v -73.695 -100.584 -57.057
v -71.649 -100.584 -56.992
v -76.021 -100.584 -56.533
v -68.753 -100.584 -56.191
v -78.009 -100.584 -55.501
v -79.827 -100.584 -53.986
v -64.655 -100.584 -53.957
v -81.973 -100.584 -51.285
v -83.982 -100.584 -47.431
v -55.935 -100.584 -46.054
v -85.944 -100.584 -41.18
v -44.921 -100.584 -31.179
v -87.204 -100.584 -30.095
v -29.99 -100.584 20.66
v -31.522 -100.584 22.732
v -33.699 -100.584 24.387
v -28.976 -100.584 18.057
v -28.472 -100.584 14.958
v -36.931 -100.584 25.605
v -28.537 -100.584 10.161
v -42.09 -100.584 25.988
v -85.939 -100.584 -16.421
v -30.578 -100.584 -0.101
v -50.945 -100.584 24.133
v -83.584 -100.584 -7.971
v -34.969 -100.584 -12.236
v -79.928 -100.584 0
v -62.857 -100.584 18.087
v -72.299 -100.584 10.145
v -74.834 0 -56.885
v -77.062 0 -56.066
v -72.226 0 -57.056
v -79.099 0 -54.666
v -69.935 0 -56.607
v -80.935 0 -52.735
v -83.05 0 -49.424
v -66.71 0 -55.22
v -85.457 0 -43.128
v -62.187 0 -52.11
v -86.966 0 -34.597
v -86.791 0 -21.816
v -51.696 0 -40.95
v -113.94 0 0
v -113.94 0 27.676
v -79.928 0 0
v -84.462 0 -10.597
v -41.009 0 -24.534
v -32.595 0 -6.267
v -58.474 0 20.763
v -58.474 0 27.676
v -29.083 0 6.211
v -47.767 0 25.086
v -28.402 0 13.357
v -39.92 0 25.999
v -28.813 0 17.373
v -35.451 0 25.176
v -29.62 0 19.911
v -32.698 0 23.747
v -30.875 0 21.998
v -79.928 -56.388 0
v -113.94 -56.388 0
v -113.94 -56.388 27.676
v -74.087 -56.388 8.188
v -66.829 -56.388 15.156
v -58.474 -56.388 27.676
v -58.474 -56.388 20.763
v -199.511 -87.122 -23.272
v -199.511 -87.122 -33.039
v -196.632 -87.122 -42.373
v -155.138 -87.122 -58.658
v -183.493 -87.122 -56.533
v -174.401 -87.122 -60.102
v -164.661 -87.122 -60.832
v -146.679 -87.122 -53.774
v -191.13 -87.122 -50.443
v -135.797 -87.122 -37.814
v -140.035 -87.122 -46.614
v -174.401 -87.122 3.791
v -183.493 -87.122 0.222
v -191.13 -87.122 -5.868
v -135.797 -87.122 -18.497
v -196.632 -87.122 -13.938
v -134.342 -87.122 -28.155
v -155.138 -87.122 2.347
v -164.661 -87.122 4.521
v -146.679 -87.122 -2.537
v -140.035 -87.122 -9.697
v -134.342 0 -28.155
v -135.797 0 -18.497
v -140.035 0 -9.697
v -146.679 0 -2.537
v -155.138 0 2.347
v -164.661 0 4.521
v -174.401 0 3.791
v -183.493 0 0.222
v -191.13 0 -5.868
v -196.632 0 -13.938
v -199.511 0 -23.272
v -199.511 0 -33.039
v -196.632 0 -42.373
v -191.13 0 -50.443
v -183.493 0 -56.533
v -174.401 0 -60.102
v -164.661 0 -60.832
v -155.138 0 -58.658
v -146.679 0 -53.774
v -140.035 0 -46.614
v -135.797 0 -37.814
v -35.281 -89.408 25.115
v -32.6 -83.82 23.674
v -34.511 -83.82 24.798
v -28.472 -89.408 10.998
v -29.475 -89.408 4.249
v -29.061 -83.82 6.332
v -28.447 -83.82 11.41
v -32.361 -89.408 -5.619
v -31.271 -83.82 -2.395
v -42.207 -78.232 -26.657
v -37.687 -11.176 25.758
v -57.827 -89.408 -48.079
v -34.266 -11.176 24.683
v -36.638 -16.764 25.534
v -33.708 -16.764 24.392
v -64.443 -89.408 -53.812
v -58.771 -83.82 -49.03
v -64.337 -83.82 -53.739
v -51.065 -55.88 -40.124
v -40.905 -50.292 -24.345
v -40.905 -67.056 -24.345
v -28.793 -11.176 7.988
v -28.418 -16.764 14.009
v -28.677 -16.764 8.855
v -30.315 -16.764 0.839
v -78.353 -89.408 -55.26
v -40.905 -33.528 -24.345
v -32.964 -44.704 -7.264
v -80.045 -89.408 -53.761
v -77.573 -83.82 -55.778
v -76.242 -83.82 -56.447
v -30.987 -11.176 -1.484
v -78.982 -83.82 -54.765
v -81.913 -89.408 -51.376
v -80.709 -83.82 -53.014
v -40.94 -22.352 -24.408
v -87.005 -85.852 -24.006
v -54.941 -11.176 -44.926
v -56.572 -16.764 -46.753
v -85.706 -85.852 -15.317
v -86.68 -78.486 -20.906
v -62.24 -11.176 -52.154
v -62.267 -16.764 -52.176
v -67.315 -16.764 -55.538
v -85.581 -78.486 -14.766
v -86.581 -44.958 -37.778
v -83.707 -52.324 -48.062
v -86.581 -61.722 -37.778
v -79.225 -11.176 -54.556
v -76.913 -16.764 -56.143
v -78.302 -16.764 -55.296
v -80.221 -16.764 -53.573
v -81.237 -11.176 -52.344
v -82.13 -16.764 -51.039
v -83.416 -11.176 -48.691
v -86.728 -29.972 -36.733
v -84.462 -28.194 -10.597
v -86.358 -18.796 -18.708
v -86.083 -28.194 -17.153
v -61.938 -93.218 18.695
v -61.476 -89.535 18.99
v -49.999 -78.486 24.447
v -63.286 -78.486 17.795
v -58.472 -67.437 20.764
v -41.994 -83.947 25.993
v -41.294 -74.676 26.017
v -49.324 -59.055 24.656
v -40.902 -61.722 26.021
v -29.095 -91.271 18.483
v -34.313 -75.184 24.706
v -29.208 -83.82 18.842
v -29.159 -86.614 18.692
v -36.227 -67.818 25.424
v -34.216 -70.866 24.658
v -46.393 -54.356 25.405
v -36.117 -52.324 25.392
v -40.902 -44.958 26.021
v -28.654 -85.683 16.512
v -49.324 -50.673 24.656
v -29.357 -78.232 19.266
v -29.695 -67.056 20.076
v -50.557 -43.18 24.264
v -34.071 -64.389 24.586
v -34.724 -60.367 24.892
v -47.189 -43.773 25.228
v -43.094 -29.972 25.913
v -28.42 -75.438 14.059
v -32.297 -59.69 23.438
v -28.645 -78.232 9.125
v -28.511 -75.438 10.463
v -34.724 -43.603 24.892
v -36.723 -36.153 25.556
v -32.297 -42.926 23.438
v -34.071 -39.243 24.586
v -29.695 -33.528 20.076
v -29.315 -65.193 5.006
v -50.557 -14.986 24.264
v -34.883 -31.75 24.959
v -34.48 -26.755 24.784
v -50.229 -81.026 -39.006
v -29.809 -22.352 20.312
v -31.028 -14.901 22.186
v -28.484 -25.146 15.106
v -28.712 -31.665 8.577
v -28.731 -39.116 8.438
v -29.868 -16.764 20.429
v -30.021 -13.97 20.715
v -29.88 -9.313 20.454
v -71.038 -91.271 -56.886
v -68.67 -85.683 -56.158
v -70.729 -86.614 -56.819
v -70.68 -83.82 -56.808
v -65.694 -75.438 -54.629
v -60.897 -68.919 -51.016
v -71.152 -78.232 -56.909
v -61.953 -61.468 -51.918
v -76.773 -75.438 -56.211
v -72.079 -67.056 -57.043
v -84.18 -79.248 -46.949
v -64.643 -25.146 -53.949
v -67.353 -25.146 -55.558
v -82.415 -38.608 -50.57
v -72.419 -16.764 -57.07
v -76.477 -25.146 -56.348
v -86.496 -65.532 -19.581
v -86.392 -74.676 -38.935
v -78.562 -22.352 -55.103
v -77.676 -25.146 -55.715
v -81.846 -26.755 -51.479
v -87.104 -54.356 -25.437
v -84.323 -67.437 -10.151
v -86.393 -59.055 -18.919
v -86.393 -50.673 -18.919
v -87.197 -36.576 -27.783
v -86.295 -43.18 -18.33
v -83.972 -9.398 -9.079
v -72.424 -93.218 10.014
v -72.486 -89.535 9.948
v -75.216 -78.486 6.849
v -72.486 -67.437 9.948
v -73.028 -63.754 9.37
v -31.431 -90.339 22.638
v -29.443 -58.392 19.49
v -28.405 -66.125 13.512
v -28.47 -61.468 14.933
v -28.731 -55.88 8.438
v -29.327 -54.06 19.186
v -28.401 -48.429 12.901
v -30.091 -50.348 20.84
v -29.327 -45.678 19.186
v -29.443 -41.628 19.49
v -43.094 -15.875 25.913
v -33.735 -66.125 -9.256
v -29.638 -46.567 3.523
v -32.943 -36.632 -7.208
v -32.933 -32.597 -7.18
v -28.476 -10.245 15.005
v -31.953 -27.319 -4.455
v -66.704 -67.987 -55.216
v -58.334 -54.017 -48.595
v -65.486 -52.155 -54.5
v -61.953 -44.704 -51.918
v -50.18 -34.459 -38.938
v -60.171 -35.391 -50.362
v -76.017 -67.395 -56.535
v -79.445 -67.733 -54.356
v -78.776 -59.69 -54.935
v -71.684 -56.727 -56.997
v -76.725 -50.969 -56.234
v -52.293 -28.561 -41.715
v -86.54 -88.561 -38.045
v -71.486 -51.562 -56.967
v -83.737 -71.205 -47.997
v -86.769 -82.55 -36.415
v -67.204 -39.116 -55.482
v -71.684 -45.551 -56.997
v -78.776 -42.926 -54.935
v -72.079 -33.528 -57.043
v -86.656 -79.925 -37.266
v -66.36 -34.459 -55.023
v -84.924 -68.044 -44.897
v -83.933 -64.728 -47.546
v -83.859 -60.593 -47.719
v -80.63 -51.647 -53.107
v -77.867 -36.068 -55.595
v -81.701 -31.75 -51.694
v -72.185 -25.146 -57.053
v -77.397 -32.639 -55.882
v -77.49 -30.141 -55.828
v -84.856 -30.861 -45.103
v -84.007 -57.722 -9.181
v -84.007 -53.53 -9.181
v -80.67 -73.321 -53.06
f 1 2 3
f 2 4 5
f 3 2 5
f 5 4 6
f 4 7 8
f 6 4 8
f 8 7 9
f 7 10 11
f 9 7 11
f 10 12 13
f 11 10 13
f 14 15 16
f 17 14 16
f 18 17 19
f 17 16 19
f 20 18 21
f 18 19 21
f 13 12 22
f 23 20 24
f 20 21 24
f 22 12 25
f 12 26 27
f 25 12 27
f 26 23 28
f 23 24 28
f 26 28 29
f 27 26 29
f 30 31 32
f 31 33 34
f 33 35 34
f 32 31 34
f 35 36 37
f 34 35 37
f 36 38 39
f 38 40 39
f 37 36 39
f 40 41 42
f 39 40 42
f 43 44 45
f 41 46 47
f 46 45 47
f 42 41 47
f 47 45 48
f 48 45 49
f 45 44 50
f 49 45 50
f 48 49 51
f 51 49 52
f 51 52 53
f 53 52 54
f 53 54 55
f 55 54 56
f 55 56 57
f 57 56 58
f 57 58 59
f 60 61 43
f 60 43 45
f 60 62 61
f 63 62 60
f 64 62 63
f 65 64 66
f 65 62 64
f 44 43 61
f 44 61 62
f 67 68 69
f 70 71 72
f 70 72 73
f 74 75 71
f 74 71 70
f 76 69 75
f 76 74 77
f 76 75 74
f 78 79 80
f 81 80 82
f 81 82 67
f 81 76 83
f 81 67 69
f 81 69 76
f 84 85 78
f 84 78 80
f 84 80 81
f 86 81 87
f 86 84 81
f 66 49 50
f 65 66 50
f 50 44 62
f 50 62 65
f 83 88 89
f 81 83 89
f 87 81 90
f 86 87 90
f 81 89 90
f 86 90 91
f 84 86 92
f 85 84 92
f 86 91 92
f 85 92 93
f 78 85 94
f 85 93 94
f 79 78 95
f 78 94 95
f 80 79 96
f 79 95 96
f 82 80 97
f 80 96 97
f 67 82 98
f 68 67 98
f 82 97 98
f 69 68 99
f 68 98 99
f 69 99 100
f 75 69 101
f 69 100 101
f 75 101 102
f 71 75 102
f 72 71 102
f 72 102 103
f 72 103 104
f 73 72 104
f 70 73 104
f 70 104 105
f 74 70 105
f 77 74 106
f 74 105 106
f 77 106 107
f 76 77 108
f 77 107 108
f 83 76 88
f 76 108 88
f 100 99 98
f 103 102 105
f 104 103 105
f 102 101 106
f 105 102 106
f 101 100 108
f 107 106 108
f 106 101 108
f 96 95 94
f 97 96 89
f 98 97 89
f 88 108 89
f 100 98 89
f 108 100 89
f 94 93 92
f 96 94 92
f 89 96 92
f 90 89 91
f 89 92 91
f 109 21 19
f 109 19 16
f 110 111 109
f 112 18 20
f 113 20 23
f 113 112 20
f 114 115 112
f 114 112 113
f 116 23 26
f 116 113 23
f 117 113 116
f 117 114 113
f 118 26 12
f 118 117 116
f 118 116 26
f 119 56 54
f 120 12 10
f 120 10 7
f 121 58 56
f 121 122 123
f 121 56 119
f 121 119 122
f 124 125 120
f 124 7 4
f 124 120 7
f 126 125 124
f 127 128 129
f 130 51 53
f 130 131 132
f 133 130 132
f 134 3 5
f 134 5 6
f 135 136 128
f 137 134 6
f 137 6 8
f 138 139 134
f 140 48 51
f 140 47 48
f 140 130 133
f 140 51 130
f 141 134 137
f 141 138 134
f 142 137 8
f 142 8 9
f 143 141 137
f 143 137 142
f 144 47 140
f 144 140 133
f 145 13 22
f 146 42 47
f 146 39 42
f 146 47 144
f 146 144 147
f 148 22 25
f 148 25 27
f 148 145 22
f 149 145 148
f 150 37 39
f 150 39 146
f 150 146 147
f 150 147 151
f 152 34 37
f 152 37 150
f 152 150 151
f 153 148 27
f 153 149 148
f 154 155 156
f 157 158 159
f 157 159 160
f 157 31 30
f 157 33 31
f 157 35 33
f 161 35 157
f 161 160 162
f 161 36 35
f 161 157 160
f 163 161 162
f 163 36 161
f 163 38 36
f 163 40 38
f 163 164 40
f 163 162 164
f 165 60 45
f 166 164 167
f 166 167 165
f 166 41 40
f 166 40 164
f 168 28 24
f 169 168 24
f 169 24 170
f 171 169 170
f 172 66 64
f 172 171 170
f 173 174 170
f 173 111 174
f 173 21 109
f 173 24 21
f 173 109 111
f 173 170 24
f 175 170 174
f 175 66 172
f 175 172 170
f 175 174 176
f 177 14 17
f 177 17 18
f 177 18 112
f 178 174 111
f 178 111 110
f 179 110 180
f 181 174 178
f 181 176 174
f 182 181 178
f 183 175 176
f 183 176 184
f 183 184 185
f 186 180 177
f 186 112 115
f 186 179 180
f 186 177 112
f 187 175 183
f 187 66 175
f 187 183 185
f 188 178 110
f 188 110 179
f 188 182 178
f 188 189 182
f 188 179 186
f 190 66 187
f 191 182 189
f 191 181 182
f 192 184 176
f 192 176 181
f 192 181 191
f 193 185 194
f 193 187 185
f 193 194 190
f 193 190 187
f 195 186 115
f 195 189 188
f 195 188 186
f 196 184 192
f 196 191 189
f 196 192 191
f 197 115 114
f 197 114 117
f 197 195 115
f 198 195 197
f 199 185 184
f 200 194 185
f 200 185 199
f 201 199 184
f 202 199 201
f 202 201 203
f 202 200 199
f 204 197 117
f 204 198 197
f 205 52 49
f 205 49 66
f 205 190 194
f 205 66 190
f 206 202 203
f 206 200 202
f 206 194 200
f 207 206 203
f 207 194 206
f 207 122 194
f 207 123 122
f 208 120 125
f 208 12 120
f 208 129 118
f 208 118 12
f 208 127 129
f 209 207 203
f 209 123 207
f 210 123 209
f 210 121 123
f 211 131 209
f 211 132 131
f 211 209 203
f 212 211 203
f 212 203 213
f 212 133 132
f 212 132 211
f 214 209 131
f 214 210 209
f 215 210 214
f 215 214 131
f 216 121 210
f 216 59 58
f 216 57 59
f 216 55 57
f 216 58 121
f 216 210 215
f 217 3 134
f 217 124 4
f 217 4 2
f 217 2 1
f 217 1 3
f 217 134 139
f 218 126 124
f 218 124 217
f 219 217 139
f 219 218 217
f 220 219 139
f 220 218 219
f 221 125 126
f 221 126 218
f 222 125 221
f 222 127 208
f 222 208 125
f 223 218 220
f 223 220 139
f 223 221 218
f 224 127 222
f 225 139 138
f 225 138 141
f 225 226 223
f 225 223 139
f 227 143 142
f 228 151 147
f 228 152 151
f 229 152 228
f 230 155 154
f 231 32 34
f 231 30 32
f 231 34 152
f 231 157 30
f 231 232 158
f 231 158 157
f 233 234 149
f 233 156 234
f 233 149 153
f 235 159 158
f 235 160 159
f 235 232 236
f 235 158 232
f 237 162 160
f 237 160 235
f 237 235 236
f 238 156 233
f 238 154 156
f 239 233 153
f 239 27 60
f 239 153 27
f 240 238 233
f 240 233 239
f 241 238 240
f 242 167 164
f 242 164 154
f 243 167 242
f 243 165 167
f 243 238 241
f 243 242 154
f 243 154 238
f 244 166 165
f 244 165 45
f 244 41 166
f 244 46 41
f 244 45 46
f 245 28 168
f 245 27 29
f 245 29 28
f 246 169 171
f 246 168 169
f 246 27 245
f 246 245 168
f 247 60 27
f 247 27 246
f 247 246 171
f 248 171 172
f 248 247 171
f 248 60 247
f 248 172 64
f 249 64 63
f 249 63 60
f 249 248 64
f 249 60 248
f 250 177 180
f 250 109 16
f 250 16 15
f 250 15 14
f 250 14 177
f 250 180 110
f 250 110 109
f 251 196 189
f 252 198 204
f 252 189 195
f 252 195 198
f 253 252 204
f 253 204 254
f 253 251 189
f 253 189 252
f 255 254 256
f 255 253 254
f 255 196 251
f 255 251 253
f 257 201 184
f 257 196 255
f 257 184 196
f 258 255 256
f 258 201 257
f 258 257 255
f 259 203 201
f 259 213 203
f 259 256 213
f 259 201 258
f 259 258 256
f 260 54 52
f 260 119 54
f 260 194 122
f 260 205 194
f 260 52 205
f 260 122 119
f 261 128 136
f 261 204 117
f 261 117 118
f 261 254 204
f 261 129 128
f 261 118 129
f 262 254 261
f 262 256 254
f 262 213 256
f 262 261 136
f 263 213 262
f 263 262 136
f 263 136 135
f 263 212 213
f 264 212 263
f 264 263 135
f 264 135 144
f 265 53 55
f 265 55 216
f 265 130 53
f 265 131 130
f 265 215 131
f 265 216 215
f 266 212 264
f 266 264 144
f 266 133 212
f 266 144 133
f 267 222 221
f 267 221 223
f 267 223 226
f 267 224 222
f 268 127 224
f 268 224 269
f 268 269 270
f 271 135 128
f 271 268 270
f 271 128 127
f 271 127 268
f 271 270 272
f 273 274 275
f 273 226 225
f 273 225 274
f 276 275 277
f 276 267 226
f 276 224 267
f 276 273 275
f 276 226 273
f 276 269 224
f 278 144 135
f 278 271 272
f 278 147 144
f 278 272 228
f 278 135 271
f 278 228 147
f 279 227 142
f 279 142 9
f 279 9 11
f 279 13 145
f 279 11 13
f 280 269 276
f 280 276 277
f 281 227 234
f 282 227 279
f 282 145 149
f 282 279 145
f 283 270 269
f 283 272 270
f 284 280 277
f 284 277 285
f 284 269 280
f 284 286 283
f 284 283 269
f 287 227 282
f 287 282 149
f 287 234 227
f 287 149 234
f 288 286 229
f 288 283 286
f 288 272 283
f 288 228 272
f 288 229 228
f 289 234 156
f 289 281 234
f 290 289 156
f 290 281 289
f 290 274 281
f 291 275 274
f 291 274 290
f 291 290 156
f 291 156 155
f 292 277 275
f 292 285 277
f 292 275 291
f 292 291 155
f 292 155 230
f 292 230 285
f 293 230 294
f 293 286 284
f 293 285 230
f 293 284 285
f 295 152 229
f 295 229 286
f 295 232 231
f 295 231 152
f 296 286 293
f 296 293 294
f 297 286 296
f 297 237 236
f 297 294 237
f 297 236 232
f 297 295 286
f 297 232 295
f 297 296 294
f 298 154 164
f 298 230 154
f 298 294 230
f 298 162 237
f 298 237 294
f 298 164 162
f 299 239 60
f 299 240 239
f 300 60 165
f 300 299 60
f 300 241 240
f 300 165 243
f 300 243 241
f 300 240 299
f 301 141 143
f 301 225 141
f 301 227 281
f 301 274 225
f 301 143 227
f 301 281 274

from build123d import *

# Parameters (mm, degrees)
F0_W     = 55.4656796157
F0_H     = 27.6757963002
F1_DEPTH = 56.388
F3_DEPTH = 100.584
F4_R     = 32.7676848389
F5_DEPTH = 87.122


# Not quite as in the source:
# - the program builds the solid bodies; features that only make, move or delete a surface that nothing else refers to are left out


with BuildPart() as f1:
    # F0 (on Front) → F1 (new body)
    with BuildSketch(Plane.XZ):
        with Locations((-86.2072575837, 13.8378981501)):
            Rectangle(F0_W, F0_H)
    extrude(amount=F1_DEPTH)

    # F2 (on Front) → F3 (join)
    with BuildSketch(Plane.XZ):
        with BuildLine():
            add(Edge.make_bspline(
                [(-79.9281299114, 0), (-67.0930481433, 22.5193468072), (3.5177028216, 48.0479908411), (-79.4689797754, -102.0854924294), (-93.1701175455, -23.2332693579), (-79.9281299114, 0)],
                knots=[0, 0, 0, 0, 0.3023771538, 0.6880366948, 1, 1, 1, 1], degree=3))
        make_face()
    extrude(amount=F3_DEPTH)


with BuildPart() as f5:
    # F4 (on Front) → F5 (new body)
    with BuildSketch(Plane.XZ):
        with Locations((-167.1092659235, -28.1554553658)):
            Circle(F4_R)
    extrude(amount=F5_DEPTH)


solid = Compound([f1.part, f5.part])
